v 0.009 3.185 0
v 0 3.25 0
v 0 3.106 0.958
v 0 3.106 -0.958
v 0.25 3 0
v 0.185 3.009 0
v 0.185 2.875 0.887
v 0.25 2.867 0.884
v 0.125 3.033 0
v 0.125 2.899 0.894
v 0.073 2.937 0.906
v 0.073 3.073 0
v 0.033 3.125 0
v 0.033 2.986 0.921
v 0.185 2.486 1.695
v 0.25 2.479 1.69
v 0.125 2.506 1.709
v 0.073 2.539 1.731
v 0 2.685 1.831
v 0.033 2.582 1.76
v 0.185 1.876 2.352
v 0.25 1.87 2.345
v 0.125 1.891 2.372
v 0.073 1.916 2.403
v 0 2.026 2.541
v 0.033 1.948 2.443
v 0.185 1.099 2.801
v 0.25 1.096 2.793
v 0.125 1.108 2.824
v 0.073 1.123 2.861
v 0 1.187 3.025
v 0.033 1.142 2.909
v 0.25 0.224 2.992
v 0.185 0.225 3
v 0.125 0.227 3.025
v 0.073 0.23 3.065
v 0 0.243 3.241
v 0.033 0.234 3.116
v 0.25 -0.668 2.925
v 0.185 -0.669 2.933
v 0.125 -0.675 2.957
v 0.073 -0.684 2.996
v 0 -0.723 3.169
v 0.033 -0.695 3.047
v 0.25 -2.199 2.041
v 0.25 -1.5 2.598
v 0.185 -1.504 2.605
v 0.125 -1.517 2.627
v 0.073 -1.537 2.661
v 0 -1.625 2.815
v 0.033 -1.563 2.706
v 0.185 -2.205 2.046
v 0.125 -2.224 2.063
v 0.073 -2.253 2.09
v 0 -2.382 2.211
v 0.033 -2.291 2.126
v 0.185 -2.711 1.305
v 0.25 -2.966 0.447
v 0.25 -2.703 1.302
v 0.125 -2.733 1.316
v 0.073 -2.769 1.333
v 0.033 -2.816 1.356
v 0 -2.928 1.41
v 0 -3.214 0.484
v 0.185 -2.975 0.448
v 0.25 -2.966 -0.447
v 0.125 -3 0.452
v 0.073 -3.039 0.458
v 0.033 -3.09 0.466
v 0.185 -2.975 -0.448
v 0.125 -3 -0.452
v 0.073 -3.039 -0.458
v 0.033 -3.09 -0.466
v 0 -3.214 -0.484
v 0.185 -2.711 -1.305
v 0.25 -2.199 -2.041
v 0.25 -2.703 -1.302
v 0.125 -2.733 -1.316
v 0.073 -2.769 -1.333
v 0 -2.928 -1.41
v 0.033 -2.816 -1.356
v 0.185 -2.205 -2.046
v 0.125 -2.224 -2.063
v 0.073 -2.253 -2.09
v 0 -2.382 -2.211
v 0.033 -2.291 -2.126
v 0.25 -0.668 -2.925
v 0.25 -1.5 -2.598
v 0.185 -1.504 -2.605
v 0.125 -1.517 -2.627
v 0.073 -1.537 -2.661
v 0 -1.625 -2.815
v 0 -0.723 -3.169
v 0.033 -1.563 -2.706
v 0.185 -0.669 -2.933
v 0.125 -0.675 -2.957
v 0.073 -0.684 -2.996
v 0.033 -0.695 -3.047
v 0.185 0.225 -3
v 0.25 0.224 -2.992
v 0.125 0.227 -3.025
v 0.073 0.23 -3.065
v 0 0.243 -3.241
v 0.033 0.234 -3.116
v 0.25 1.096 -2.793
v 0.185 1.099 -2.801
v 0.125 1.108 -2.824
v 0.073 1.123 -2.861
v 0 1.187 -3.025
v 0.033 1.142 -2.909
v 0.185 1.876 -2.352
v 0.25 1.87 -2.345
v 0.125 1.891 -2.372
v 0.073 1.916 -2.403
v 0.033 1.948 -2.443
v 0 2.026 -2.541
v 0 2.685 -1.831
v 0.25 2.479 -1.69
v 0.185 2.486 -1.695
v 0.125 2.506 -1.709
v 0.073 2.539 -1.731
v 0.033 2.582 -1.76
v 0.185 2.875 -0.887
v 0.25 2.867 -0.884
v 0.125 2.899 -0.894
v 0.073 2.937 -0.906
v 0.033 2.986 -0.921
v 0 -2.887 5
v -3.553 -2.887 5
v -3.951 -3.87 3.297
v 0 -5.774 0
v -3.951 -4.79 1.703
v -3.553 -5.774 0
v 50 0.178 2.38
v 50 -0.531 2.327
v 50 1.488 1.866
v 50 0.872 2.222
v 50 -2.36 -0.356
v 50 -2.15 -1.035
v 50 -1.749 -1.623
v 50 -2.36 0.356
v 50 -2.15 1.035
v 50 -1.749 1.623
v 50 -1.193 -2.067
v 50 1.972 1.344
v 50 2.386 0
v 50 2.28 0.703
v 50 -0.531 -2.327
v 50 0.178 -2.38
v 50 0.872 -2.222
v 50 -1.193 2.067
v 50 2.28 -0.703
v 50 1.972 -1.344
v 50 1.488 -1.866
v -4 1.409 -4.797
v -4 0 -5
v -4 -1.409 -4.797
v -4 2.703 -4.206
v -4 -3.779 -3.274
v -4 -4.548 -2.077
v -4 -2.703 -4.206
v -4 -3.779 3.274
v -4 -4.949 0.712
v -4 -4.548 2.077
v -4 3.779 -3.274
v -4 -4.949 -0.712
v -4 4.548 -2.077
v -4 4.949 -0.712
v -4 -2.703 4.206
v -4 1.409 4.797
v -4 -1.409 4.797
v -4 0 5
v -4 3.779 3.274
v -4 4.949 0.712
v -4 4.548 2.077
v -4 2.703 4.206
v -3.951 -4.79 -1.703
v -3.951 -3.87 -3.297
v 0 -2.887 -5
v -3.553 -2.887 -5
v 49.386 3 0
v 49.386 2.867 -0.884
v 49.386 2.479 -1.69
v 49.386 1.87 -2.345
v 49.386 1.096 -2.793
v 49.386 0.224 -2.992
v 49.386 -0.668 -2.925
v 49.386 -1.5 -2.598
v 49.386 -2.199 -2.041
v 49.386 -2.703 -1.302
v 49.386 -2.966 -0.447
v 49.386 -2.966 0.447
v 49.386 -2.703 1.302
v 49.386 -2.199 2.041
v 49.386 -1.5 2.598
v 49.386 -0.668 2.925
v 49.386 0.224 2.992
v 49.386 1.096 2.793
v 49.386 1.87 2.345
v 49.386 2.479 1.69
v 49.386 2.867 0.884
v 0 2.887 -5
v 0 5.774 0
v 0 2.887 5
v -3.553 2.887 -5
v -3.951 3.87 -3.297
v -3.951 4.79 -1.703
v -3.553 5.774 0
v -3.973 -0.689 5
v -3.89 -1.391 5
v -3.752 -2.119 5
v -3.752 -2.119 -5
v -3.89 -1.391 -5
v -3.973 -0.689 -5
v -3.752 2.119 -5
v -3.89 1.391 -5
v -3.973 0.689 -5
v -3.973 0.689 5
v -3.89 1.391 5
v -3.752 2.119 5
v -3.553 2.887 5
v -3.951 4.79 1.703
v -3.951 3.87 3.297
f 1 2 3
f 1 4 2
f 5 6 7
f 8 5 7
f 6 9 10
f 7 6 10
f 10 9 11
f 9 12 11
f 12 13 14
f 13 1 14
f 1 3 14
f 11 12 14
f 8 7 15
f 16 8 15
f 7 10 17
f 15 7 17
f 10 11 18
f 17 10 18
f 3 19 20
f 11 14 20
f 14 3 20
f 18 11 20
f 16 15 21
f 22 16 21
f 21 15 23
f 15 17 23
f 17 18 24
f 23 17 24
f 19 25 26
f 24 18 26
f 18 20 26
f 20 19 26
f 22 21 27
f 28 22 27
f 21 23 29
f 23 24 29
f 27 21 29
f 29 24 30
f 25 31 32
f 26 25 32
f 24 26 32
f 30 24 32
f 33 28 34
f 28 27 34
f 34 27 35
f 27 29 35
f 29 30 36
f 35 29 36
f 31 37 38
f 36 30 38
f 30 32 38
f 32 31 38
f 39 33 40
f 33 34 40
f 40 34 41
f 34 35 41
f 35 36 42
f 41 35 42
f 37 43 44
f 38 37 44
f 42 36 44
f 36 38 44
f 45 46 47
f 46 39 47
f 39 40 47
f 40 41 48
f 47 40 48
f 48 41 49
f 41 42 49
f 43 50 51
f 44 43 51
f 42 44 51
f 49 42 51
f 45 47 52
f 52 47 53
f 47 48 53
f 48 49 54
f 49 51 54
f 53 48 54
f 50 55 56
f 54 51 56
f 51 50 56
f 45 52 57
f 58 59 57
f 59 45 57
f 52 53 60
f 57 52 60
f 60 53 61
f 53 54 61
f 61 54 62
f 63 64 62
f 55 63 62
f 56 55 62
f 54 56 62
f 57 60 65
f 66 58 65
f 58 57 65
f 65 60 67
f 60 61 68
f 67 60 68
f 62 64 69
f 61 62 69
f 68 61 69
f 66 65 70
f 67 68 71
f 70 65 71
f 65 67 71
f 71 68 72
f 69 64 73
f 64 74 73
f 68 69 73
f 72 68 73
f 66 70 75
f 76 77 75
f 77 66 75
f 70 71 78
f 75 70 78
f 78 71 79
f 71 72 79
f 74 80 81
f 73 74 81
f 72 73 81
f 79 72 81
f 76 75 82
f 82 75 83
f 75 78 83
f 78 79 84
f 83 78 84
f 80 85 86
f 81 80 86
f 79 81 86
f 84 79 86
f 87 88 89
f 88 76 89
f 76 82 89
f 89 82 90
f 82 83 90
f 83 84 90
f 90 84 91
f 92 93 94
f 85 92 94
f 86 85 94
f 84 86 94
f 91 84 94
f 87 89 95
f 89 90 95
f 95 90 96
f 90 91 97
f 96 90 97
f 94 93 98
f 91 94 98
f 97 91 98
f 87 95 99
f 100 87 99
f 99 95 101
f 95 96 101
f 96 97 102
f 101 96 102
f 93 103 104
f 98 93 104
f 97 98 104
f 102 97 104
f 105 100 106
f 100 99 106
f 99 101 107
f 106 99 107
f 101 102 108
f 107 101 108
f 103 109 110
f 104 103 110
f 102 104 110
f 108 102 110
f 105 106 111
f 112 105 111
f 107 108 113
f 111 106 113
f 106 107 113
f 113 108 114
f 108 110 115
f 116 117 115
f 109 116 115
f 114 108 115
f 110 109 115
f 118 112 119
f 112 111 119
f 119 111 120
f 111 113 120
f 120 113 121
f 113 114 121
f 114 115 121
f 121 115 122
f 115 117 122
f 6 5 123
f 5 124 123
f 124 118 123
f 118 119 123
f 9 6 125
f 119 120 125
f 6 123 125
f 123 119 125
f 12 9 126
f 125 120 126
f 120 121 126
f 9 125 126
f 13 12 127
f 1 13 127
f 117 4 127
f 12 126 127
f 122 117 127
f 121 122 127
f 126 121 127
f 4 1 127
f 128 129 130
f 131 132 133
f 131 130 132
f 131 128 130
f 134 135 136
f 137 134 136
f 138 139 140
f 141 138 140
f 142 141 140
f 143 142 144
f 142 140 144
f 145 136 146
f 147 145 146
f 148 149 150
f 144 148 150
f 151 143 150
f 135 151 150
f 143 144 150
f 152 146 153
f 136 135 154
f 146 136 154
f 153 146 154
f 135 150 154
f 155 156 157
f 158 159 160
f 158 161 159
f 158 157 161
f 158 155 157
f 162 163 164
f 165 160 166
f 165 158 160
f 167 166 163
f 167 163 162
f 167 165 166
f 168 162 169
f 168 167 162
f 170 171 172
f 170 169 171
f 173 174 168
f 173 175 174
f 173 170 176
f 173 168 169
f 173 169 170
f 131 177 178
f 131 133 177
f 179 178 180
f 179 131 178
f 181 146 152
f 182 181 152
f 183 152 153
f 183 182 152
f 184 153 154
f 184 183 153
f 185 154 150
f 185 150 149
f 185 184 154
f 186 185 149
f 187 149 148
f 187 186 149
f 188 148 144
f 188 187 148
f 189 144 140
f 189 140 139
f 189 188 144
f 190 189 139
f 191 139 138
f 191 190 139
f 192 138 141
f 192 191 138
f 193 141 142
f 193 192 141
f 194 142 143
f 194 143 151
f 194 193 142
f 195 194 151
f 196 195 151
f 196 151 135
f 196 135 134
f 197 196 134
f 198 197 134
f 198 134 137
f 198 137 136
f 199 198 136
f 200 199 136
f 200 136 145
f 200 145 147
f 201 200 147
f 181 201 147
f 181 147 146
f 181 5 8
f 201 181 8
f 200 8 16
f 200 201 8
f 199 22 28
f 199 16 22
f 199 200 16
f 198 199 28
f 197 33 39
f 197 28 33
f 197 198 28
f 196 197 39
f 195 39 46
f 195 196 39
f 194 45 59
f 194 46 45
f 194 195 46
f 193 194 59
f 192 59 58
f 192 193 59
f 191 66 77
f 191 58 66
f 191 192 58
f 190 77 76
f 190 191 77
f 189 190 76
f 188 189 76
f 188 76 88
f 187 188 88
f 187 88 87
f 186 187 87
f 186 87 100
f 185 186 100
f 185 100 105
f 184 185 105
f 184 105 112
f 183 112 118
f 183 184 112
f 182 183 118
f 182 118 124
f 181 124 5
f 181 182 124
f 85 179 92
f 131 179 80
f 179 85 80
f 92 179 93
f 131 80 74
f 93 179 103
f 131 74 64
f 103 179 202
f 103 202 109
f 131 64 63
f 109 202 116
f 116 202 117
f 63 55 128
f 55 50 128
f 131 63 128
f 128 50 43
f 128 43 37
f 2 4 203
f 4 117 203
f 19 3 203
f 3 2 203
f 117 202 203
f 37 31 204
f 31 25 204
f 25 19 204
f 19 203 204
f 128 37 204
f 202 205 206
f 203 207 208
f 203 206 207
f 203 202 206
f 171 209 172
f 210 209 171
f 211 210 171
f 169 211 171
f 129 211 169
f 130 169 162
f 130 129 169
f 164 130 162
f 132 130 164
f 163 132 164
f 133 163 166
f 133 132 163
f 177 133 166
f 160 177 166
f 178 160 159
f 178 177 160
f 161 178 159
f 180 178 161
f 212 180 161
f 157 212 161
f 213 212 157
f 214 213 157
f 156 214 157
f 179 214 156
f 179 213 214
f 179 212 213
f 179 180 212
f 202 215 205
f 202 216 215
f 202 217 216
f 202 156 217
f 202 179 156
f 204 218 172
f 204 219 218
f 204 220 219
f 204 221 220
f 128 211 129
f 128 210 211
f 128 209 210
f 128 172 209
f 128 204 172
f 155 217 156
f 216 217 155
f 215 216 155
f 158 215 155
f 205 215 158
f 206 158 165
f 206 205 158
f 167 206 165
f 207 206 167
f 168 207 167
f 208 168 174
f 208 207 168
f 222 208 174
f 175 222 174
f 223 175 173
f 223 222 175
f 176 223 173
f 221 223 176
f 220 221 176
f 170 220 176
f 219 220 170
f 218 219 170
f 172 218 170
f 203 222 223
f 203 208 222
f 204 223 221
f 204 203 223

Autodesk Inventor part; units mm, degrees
ref_plane "YZ Plane" through (0, 0, 0) normal (1, 0, 0) x (0, 1, 0)
ref_plane "XZ Plane" through (0, 0, 0) normal (0, 1, 0) x (-1, 0, 0)
sketch "Sketch1" plane through (0, 0, 0) normal (0, 0, 1) x (1, 0, 0)
  line L0 (0, 3) -> (50, 3)
  line L1 (50, 3) -> (50, 0)
  line L2 (50, 0) -> (0, 0)
  line L3 (-10, 0) -> (60, 0) projected
  line L4 (0, -0.6) -> (0, 3.6) projected
  line L5 (0, 3) -> (0, 0)
  dimension "d2" = 6
  dimension "d59" = 50
revolve "Body" add sketch "Sketch1" angle 360 about axis through (50, 0, 0) along (-1, 0, 0)
sketch "Sketch2" plane through (0, 0, 0) normal (-1, 0, 0) x (0, 0, 1)
  line L0 (0, 5.7735) -> (5, 2.8868)
  line L1 (5, 2.8868) -> (5, -2.8868)
  line L2 (5, -2.8868) -> (0, -5.7735)
  line L3 (0, -5.7735) -> (-5, -2.8868)
  line L4 (-5, -2.8868) -> (-5, 2.8868)
  line L5 (-5, 2.8868) -> (0, 5.7735)
  line L6 (-7, 0) -> (7, 0) projected
  line L7 (0, 8.0829) -> (0, -8.0829) projected
  point P0 (0, 0)
  point P1 (0, 0)
  dimension "d11" = 10
extrude "Head" add sketch "Sketch2" along normal blind 4
sketch "Sketch4" plane through (0, 0, 0) normal (0, 0, 1) x (1, 0, 0)
  line L0 (-3.4226, 6) -> (-4, 5)
  line L1 (-1.1, 0) -> (-0.234, 0)
  line L2 (-4.7532, 0) -> (0.5192, 0) projected
  line L3 (-4, 6) -> (-3.4226, 6)
  line L4 (-4, 5) -> (-4, 6)
  line L5 (0, 7.2) -> (0, -1.2) projected
  dimension "d65" = 10
  dimension "d67" = 30
  dimension "d68" = 12
  dimension "d69" = 4
revolve "Chamfer1" cut sketch "Sketch4" angle 360 about axis through (-1.1, 0, 0) along (1, 0, 0)
thread "Thread" size "M6x1" designation "M6" class "6g" standard "GB Metric profile" length 49
chamfer "Chamfer2" distance 0.6135 distance2 0.6136 1 edges at (50, -3, 0) measured on face at (50, 0.3546, -0.935)
fillet "Fillet2" radius 0.25 1 edges at (0, -3, 0)
ref_plane "Work Plane1" through (1.525, 0, 0) normal (0, 0, 1) x (1, 0, 0)
equation "\"d2\" = GD"
equation "\"d59\" = NLG"
equation "\"d11\" = SW"
equation "\"d3\" = KOH"
equation "\"d71\" = RR"
equation "\"d15\" = GEL"
equation "\"d6\" = -0.5 * SPD + 0.5 * GD"
equation "\"d65\" = SW"
equation "\"d67\" = ANG1"
equation "\"d68\" = 1.2 * SW"
equation "\"d69\" = KOH"
equation "\"NLG\" = 50"
equation "\"GD\" = NND"
equation "\"BDM\" = NND"
equation "\"KOH\" = 4"
equation "\"GEL\" = 49"
equation "\"SW\" = 10"
equation "\"SPD\" = NND - 1.2269 * PTC"
equation "\"SD2\" = NND"
equation "\"SD\" = 0"
equation "\"ANG1\" = 30deg"
equation "\"GAL\" = 0.61345 * PTC"
equation "\"GUL\" = 0.61345 * PTC"
equation "\"RR\" = 0.25"
equation "\"RR1\" = 0.1"
equation "\"WFT\" = 0"
equation "\"GD1\" = THREADDIA - 1.2269 * PTC"
equation "\"THREADDIA\" = 6"
equation "\"TOA\" = 30deg"
equation "\"FAWI\" = 90deg"
equation "\"PTC\" = 1"
equation "\"NND\" = 6"
equation "\"E0\" = 1.155 * SW"
properties part number "Hexagon bolt GB/T 5781 M6 x 50" material "Steel, Mild"
